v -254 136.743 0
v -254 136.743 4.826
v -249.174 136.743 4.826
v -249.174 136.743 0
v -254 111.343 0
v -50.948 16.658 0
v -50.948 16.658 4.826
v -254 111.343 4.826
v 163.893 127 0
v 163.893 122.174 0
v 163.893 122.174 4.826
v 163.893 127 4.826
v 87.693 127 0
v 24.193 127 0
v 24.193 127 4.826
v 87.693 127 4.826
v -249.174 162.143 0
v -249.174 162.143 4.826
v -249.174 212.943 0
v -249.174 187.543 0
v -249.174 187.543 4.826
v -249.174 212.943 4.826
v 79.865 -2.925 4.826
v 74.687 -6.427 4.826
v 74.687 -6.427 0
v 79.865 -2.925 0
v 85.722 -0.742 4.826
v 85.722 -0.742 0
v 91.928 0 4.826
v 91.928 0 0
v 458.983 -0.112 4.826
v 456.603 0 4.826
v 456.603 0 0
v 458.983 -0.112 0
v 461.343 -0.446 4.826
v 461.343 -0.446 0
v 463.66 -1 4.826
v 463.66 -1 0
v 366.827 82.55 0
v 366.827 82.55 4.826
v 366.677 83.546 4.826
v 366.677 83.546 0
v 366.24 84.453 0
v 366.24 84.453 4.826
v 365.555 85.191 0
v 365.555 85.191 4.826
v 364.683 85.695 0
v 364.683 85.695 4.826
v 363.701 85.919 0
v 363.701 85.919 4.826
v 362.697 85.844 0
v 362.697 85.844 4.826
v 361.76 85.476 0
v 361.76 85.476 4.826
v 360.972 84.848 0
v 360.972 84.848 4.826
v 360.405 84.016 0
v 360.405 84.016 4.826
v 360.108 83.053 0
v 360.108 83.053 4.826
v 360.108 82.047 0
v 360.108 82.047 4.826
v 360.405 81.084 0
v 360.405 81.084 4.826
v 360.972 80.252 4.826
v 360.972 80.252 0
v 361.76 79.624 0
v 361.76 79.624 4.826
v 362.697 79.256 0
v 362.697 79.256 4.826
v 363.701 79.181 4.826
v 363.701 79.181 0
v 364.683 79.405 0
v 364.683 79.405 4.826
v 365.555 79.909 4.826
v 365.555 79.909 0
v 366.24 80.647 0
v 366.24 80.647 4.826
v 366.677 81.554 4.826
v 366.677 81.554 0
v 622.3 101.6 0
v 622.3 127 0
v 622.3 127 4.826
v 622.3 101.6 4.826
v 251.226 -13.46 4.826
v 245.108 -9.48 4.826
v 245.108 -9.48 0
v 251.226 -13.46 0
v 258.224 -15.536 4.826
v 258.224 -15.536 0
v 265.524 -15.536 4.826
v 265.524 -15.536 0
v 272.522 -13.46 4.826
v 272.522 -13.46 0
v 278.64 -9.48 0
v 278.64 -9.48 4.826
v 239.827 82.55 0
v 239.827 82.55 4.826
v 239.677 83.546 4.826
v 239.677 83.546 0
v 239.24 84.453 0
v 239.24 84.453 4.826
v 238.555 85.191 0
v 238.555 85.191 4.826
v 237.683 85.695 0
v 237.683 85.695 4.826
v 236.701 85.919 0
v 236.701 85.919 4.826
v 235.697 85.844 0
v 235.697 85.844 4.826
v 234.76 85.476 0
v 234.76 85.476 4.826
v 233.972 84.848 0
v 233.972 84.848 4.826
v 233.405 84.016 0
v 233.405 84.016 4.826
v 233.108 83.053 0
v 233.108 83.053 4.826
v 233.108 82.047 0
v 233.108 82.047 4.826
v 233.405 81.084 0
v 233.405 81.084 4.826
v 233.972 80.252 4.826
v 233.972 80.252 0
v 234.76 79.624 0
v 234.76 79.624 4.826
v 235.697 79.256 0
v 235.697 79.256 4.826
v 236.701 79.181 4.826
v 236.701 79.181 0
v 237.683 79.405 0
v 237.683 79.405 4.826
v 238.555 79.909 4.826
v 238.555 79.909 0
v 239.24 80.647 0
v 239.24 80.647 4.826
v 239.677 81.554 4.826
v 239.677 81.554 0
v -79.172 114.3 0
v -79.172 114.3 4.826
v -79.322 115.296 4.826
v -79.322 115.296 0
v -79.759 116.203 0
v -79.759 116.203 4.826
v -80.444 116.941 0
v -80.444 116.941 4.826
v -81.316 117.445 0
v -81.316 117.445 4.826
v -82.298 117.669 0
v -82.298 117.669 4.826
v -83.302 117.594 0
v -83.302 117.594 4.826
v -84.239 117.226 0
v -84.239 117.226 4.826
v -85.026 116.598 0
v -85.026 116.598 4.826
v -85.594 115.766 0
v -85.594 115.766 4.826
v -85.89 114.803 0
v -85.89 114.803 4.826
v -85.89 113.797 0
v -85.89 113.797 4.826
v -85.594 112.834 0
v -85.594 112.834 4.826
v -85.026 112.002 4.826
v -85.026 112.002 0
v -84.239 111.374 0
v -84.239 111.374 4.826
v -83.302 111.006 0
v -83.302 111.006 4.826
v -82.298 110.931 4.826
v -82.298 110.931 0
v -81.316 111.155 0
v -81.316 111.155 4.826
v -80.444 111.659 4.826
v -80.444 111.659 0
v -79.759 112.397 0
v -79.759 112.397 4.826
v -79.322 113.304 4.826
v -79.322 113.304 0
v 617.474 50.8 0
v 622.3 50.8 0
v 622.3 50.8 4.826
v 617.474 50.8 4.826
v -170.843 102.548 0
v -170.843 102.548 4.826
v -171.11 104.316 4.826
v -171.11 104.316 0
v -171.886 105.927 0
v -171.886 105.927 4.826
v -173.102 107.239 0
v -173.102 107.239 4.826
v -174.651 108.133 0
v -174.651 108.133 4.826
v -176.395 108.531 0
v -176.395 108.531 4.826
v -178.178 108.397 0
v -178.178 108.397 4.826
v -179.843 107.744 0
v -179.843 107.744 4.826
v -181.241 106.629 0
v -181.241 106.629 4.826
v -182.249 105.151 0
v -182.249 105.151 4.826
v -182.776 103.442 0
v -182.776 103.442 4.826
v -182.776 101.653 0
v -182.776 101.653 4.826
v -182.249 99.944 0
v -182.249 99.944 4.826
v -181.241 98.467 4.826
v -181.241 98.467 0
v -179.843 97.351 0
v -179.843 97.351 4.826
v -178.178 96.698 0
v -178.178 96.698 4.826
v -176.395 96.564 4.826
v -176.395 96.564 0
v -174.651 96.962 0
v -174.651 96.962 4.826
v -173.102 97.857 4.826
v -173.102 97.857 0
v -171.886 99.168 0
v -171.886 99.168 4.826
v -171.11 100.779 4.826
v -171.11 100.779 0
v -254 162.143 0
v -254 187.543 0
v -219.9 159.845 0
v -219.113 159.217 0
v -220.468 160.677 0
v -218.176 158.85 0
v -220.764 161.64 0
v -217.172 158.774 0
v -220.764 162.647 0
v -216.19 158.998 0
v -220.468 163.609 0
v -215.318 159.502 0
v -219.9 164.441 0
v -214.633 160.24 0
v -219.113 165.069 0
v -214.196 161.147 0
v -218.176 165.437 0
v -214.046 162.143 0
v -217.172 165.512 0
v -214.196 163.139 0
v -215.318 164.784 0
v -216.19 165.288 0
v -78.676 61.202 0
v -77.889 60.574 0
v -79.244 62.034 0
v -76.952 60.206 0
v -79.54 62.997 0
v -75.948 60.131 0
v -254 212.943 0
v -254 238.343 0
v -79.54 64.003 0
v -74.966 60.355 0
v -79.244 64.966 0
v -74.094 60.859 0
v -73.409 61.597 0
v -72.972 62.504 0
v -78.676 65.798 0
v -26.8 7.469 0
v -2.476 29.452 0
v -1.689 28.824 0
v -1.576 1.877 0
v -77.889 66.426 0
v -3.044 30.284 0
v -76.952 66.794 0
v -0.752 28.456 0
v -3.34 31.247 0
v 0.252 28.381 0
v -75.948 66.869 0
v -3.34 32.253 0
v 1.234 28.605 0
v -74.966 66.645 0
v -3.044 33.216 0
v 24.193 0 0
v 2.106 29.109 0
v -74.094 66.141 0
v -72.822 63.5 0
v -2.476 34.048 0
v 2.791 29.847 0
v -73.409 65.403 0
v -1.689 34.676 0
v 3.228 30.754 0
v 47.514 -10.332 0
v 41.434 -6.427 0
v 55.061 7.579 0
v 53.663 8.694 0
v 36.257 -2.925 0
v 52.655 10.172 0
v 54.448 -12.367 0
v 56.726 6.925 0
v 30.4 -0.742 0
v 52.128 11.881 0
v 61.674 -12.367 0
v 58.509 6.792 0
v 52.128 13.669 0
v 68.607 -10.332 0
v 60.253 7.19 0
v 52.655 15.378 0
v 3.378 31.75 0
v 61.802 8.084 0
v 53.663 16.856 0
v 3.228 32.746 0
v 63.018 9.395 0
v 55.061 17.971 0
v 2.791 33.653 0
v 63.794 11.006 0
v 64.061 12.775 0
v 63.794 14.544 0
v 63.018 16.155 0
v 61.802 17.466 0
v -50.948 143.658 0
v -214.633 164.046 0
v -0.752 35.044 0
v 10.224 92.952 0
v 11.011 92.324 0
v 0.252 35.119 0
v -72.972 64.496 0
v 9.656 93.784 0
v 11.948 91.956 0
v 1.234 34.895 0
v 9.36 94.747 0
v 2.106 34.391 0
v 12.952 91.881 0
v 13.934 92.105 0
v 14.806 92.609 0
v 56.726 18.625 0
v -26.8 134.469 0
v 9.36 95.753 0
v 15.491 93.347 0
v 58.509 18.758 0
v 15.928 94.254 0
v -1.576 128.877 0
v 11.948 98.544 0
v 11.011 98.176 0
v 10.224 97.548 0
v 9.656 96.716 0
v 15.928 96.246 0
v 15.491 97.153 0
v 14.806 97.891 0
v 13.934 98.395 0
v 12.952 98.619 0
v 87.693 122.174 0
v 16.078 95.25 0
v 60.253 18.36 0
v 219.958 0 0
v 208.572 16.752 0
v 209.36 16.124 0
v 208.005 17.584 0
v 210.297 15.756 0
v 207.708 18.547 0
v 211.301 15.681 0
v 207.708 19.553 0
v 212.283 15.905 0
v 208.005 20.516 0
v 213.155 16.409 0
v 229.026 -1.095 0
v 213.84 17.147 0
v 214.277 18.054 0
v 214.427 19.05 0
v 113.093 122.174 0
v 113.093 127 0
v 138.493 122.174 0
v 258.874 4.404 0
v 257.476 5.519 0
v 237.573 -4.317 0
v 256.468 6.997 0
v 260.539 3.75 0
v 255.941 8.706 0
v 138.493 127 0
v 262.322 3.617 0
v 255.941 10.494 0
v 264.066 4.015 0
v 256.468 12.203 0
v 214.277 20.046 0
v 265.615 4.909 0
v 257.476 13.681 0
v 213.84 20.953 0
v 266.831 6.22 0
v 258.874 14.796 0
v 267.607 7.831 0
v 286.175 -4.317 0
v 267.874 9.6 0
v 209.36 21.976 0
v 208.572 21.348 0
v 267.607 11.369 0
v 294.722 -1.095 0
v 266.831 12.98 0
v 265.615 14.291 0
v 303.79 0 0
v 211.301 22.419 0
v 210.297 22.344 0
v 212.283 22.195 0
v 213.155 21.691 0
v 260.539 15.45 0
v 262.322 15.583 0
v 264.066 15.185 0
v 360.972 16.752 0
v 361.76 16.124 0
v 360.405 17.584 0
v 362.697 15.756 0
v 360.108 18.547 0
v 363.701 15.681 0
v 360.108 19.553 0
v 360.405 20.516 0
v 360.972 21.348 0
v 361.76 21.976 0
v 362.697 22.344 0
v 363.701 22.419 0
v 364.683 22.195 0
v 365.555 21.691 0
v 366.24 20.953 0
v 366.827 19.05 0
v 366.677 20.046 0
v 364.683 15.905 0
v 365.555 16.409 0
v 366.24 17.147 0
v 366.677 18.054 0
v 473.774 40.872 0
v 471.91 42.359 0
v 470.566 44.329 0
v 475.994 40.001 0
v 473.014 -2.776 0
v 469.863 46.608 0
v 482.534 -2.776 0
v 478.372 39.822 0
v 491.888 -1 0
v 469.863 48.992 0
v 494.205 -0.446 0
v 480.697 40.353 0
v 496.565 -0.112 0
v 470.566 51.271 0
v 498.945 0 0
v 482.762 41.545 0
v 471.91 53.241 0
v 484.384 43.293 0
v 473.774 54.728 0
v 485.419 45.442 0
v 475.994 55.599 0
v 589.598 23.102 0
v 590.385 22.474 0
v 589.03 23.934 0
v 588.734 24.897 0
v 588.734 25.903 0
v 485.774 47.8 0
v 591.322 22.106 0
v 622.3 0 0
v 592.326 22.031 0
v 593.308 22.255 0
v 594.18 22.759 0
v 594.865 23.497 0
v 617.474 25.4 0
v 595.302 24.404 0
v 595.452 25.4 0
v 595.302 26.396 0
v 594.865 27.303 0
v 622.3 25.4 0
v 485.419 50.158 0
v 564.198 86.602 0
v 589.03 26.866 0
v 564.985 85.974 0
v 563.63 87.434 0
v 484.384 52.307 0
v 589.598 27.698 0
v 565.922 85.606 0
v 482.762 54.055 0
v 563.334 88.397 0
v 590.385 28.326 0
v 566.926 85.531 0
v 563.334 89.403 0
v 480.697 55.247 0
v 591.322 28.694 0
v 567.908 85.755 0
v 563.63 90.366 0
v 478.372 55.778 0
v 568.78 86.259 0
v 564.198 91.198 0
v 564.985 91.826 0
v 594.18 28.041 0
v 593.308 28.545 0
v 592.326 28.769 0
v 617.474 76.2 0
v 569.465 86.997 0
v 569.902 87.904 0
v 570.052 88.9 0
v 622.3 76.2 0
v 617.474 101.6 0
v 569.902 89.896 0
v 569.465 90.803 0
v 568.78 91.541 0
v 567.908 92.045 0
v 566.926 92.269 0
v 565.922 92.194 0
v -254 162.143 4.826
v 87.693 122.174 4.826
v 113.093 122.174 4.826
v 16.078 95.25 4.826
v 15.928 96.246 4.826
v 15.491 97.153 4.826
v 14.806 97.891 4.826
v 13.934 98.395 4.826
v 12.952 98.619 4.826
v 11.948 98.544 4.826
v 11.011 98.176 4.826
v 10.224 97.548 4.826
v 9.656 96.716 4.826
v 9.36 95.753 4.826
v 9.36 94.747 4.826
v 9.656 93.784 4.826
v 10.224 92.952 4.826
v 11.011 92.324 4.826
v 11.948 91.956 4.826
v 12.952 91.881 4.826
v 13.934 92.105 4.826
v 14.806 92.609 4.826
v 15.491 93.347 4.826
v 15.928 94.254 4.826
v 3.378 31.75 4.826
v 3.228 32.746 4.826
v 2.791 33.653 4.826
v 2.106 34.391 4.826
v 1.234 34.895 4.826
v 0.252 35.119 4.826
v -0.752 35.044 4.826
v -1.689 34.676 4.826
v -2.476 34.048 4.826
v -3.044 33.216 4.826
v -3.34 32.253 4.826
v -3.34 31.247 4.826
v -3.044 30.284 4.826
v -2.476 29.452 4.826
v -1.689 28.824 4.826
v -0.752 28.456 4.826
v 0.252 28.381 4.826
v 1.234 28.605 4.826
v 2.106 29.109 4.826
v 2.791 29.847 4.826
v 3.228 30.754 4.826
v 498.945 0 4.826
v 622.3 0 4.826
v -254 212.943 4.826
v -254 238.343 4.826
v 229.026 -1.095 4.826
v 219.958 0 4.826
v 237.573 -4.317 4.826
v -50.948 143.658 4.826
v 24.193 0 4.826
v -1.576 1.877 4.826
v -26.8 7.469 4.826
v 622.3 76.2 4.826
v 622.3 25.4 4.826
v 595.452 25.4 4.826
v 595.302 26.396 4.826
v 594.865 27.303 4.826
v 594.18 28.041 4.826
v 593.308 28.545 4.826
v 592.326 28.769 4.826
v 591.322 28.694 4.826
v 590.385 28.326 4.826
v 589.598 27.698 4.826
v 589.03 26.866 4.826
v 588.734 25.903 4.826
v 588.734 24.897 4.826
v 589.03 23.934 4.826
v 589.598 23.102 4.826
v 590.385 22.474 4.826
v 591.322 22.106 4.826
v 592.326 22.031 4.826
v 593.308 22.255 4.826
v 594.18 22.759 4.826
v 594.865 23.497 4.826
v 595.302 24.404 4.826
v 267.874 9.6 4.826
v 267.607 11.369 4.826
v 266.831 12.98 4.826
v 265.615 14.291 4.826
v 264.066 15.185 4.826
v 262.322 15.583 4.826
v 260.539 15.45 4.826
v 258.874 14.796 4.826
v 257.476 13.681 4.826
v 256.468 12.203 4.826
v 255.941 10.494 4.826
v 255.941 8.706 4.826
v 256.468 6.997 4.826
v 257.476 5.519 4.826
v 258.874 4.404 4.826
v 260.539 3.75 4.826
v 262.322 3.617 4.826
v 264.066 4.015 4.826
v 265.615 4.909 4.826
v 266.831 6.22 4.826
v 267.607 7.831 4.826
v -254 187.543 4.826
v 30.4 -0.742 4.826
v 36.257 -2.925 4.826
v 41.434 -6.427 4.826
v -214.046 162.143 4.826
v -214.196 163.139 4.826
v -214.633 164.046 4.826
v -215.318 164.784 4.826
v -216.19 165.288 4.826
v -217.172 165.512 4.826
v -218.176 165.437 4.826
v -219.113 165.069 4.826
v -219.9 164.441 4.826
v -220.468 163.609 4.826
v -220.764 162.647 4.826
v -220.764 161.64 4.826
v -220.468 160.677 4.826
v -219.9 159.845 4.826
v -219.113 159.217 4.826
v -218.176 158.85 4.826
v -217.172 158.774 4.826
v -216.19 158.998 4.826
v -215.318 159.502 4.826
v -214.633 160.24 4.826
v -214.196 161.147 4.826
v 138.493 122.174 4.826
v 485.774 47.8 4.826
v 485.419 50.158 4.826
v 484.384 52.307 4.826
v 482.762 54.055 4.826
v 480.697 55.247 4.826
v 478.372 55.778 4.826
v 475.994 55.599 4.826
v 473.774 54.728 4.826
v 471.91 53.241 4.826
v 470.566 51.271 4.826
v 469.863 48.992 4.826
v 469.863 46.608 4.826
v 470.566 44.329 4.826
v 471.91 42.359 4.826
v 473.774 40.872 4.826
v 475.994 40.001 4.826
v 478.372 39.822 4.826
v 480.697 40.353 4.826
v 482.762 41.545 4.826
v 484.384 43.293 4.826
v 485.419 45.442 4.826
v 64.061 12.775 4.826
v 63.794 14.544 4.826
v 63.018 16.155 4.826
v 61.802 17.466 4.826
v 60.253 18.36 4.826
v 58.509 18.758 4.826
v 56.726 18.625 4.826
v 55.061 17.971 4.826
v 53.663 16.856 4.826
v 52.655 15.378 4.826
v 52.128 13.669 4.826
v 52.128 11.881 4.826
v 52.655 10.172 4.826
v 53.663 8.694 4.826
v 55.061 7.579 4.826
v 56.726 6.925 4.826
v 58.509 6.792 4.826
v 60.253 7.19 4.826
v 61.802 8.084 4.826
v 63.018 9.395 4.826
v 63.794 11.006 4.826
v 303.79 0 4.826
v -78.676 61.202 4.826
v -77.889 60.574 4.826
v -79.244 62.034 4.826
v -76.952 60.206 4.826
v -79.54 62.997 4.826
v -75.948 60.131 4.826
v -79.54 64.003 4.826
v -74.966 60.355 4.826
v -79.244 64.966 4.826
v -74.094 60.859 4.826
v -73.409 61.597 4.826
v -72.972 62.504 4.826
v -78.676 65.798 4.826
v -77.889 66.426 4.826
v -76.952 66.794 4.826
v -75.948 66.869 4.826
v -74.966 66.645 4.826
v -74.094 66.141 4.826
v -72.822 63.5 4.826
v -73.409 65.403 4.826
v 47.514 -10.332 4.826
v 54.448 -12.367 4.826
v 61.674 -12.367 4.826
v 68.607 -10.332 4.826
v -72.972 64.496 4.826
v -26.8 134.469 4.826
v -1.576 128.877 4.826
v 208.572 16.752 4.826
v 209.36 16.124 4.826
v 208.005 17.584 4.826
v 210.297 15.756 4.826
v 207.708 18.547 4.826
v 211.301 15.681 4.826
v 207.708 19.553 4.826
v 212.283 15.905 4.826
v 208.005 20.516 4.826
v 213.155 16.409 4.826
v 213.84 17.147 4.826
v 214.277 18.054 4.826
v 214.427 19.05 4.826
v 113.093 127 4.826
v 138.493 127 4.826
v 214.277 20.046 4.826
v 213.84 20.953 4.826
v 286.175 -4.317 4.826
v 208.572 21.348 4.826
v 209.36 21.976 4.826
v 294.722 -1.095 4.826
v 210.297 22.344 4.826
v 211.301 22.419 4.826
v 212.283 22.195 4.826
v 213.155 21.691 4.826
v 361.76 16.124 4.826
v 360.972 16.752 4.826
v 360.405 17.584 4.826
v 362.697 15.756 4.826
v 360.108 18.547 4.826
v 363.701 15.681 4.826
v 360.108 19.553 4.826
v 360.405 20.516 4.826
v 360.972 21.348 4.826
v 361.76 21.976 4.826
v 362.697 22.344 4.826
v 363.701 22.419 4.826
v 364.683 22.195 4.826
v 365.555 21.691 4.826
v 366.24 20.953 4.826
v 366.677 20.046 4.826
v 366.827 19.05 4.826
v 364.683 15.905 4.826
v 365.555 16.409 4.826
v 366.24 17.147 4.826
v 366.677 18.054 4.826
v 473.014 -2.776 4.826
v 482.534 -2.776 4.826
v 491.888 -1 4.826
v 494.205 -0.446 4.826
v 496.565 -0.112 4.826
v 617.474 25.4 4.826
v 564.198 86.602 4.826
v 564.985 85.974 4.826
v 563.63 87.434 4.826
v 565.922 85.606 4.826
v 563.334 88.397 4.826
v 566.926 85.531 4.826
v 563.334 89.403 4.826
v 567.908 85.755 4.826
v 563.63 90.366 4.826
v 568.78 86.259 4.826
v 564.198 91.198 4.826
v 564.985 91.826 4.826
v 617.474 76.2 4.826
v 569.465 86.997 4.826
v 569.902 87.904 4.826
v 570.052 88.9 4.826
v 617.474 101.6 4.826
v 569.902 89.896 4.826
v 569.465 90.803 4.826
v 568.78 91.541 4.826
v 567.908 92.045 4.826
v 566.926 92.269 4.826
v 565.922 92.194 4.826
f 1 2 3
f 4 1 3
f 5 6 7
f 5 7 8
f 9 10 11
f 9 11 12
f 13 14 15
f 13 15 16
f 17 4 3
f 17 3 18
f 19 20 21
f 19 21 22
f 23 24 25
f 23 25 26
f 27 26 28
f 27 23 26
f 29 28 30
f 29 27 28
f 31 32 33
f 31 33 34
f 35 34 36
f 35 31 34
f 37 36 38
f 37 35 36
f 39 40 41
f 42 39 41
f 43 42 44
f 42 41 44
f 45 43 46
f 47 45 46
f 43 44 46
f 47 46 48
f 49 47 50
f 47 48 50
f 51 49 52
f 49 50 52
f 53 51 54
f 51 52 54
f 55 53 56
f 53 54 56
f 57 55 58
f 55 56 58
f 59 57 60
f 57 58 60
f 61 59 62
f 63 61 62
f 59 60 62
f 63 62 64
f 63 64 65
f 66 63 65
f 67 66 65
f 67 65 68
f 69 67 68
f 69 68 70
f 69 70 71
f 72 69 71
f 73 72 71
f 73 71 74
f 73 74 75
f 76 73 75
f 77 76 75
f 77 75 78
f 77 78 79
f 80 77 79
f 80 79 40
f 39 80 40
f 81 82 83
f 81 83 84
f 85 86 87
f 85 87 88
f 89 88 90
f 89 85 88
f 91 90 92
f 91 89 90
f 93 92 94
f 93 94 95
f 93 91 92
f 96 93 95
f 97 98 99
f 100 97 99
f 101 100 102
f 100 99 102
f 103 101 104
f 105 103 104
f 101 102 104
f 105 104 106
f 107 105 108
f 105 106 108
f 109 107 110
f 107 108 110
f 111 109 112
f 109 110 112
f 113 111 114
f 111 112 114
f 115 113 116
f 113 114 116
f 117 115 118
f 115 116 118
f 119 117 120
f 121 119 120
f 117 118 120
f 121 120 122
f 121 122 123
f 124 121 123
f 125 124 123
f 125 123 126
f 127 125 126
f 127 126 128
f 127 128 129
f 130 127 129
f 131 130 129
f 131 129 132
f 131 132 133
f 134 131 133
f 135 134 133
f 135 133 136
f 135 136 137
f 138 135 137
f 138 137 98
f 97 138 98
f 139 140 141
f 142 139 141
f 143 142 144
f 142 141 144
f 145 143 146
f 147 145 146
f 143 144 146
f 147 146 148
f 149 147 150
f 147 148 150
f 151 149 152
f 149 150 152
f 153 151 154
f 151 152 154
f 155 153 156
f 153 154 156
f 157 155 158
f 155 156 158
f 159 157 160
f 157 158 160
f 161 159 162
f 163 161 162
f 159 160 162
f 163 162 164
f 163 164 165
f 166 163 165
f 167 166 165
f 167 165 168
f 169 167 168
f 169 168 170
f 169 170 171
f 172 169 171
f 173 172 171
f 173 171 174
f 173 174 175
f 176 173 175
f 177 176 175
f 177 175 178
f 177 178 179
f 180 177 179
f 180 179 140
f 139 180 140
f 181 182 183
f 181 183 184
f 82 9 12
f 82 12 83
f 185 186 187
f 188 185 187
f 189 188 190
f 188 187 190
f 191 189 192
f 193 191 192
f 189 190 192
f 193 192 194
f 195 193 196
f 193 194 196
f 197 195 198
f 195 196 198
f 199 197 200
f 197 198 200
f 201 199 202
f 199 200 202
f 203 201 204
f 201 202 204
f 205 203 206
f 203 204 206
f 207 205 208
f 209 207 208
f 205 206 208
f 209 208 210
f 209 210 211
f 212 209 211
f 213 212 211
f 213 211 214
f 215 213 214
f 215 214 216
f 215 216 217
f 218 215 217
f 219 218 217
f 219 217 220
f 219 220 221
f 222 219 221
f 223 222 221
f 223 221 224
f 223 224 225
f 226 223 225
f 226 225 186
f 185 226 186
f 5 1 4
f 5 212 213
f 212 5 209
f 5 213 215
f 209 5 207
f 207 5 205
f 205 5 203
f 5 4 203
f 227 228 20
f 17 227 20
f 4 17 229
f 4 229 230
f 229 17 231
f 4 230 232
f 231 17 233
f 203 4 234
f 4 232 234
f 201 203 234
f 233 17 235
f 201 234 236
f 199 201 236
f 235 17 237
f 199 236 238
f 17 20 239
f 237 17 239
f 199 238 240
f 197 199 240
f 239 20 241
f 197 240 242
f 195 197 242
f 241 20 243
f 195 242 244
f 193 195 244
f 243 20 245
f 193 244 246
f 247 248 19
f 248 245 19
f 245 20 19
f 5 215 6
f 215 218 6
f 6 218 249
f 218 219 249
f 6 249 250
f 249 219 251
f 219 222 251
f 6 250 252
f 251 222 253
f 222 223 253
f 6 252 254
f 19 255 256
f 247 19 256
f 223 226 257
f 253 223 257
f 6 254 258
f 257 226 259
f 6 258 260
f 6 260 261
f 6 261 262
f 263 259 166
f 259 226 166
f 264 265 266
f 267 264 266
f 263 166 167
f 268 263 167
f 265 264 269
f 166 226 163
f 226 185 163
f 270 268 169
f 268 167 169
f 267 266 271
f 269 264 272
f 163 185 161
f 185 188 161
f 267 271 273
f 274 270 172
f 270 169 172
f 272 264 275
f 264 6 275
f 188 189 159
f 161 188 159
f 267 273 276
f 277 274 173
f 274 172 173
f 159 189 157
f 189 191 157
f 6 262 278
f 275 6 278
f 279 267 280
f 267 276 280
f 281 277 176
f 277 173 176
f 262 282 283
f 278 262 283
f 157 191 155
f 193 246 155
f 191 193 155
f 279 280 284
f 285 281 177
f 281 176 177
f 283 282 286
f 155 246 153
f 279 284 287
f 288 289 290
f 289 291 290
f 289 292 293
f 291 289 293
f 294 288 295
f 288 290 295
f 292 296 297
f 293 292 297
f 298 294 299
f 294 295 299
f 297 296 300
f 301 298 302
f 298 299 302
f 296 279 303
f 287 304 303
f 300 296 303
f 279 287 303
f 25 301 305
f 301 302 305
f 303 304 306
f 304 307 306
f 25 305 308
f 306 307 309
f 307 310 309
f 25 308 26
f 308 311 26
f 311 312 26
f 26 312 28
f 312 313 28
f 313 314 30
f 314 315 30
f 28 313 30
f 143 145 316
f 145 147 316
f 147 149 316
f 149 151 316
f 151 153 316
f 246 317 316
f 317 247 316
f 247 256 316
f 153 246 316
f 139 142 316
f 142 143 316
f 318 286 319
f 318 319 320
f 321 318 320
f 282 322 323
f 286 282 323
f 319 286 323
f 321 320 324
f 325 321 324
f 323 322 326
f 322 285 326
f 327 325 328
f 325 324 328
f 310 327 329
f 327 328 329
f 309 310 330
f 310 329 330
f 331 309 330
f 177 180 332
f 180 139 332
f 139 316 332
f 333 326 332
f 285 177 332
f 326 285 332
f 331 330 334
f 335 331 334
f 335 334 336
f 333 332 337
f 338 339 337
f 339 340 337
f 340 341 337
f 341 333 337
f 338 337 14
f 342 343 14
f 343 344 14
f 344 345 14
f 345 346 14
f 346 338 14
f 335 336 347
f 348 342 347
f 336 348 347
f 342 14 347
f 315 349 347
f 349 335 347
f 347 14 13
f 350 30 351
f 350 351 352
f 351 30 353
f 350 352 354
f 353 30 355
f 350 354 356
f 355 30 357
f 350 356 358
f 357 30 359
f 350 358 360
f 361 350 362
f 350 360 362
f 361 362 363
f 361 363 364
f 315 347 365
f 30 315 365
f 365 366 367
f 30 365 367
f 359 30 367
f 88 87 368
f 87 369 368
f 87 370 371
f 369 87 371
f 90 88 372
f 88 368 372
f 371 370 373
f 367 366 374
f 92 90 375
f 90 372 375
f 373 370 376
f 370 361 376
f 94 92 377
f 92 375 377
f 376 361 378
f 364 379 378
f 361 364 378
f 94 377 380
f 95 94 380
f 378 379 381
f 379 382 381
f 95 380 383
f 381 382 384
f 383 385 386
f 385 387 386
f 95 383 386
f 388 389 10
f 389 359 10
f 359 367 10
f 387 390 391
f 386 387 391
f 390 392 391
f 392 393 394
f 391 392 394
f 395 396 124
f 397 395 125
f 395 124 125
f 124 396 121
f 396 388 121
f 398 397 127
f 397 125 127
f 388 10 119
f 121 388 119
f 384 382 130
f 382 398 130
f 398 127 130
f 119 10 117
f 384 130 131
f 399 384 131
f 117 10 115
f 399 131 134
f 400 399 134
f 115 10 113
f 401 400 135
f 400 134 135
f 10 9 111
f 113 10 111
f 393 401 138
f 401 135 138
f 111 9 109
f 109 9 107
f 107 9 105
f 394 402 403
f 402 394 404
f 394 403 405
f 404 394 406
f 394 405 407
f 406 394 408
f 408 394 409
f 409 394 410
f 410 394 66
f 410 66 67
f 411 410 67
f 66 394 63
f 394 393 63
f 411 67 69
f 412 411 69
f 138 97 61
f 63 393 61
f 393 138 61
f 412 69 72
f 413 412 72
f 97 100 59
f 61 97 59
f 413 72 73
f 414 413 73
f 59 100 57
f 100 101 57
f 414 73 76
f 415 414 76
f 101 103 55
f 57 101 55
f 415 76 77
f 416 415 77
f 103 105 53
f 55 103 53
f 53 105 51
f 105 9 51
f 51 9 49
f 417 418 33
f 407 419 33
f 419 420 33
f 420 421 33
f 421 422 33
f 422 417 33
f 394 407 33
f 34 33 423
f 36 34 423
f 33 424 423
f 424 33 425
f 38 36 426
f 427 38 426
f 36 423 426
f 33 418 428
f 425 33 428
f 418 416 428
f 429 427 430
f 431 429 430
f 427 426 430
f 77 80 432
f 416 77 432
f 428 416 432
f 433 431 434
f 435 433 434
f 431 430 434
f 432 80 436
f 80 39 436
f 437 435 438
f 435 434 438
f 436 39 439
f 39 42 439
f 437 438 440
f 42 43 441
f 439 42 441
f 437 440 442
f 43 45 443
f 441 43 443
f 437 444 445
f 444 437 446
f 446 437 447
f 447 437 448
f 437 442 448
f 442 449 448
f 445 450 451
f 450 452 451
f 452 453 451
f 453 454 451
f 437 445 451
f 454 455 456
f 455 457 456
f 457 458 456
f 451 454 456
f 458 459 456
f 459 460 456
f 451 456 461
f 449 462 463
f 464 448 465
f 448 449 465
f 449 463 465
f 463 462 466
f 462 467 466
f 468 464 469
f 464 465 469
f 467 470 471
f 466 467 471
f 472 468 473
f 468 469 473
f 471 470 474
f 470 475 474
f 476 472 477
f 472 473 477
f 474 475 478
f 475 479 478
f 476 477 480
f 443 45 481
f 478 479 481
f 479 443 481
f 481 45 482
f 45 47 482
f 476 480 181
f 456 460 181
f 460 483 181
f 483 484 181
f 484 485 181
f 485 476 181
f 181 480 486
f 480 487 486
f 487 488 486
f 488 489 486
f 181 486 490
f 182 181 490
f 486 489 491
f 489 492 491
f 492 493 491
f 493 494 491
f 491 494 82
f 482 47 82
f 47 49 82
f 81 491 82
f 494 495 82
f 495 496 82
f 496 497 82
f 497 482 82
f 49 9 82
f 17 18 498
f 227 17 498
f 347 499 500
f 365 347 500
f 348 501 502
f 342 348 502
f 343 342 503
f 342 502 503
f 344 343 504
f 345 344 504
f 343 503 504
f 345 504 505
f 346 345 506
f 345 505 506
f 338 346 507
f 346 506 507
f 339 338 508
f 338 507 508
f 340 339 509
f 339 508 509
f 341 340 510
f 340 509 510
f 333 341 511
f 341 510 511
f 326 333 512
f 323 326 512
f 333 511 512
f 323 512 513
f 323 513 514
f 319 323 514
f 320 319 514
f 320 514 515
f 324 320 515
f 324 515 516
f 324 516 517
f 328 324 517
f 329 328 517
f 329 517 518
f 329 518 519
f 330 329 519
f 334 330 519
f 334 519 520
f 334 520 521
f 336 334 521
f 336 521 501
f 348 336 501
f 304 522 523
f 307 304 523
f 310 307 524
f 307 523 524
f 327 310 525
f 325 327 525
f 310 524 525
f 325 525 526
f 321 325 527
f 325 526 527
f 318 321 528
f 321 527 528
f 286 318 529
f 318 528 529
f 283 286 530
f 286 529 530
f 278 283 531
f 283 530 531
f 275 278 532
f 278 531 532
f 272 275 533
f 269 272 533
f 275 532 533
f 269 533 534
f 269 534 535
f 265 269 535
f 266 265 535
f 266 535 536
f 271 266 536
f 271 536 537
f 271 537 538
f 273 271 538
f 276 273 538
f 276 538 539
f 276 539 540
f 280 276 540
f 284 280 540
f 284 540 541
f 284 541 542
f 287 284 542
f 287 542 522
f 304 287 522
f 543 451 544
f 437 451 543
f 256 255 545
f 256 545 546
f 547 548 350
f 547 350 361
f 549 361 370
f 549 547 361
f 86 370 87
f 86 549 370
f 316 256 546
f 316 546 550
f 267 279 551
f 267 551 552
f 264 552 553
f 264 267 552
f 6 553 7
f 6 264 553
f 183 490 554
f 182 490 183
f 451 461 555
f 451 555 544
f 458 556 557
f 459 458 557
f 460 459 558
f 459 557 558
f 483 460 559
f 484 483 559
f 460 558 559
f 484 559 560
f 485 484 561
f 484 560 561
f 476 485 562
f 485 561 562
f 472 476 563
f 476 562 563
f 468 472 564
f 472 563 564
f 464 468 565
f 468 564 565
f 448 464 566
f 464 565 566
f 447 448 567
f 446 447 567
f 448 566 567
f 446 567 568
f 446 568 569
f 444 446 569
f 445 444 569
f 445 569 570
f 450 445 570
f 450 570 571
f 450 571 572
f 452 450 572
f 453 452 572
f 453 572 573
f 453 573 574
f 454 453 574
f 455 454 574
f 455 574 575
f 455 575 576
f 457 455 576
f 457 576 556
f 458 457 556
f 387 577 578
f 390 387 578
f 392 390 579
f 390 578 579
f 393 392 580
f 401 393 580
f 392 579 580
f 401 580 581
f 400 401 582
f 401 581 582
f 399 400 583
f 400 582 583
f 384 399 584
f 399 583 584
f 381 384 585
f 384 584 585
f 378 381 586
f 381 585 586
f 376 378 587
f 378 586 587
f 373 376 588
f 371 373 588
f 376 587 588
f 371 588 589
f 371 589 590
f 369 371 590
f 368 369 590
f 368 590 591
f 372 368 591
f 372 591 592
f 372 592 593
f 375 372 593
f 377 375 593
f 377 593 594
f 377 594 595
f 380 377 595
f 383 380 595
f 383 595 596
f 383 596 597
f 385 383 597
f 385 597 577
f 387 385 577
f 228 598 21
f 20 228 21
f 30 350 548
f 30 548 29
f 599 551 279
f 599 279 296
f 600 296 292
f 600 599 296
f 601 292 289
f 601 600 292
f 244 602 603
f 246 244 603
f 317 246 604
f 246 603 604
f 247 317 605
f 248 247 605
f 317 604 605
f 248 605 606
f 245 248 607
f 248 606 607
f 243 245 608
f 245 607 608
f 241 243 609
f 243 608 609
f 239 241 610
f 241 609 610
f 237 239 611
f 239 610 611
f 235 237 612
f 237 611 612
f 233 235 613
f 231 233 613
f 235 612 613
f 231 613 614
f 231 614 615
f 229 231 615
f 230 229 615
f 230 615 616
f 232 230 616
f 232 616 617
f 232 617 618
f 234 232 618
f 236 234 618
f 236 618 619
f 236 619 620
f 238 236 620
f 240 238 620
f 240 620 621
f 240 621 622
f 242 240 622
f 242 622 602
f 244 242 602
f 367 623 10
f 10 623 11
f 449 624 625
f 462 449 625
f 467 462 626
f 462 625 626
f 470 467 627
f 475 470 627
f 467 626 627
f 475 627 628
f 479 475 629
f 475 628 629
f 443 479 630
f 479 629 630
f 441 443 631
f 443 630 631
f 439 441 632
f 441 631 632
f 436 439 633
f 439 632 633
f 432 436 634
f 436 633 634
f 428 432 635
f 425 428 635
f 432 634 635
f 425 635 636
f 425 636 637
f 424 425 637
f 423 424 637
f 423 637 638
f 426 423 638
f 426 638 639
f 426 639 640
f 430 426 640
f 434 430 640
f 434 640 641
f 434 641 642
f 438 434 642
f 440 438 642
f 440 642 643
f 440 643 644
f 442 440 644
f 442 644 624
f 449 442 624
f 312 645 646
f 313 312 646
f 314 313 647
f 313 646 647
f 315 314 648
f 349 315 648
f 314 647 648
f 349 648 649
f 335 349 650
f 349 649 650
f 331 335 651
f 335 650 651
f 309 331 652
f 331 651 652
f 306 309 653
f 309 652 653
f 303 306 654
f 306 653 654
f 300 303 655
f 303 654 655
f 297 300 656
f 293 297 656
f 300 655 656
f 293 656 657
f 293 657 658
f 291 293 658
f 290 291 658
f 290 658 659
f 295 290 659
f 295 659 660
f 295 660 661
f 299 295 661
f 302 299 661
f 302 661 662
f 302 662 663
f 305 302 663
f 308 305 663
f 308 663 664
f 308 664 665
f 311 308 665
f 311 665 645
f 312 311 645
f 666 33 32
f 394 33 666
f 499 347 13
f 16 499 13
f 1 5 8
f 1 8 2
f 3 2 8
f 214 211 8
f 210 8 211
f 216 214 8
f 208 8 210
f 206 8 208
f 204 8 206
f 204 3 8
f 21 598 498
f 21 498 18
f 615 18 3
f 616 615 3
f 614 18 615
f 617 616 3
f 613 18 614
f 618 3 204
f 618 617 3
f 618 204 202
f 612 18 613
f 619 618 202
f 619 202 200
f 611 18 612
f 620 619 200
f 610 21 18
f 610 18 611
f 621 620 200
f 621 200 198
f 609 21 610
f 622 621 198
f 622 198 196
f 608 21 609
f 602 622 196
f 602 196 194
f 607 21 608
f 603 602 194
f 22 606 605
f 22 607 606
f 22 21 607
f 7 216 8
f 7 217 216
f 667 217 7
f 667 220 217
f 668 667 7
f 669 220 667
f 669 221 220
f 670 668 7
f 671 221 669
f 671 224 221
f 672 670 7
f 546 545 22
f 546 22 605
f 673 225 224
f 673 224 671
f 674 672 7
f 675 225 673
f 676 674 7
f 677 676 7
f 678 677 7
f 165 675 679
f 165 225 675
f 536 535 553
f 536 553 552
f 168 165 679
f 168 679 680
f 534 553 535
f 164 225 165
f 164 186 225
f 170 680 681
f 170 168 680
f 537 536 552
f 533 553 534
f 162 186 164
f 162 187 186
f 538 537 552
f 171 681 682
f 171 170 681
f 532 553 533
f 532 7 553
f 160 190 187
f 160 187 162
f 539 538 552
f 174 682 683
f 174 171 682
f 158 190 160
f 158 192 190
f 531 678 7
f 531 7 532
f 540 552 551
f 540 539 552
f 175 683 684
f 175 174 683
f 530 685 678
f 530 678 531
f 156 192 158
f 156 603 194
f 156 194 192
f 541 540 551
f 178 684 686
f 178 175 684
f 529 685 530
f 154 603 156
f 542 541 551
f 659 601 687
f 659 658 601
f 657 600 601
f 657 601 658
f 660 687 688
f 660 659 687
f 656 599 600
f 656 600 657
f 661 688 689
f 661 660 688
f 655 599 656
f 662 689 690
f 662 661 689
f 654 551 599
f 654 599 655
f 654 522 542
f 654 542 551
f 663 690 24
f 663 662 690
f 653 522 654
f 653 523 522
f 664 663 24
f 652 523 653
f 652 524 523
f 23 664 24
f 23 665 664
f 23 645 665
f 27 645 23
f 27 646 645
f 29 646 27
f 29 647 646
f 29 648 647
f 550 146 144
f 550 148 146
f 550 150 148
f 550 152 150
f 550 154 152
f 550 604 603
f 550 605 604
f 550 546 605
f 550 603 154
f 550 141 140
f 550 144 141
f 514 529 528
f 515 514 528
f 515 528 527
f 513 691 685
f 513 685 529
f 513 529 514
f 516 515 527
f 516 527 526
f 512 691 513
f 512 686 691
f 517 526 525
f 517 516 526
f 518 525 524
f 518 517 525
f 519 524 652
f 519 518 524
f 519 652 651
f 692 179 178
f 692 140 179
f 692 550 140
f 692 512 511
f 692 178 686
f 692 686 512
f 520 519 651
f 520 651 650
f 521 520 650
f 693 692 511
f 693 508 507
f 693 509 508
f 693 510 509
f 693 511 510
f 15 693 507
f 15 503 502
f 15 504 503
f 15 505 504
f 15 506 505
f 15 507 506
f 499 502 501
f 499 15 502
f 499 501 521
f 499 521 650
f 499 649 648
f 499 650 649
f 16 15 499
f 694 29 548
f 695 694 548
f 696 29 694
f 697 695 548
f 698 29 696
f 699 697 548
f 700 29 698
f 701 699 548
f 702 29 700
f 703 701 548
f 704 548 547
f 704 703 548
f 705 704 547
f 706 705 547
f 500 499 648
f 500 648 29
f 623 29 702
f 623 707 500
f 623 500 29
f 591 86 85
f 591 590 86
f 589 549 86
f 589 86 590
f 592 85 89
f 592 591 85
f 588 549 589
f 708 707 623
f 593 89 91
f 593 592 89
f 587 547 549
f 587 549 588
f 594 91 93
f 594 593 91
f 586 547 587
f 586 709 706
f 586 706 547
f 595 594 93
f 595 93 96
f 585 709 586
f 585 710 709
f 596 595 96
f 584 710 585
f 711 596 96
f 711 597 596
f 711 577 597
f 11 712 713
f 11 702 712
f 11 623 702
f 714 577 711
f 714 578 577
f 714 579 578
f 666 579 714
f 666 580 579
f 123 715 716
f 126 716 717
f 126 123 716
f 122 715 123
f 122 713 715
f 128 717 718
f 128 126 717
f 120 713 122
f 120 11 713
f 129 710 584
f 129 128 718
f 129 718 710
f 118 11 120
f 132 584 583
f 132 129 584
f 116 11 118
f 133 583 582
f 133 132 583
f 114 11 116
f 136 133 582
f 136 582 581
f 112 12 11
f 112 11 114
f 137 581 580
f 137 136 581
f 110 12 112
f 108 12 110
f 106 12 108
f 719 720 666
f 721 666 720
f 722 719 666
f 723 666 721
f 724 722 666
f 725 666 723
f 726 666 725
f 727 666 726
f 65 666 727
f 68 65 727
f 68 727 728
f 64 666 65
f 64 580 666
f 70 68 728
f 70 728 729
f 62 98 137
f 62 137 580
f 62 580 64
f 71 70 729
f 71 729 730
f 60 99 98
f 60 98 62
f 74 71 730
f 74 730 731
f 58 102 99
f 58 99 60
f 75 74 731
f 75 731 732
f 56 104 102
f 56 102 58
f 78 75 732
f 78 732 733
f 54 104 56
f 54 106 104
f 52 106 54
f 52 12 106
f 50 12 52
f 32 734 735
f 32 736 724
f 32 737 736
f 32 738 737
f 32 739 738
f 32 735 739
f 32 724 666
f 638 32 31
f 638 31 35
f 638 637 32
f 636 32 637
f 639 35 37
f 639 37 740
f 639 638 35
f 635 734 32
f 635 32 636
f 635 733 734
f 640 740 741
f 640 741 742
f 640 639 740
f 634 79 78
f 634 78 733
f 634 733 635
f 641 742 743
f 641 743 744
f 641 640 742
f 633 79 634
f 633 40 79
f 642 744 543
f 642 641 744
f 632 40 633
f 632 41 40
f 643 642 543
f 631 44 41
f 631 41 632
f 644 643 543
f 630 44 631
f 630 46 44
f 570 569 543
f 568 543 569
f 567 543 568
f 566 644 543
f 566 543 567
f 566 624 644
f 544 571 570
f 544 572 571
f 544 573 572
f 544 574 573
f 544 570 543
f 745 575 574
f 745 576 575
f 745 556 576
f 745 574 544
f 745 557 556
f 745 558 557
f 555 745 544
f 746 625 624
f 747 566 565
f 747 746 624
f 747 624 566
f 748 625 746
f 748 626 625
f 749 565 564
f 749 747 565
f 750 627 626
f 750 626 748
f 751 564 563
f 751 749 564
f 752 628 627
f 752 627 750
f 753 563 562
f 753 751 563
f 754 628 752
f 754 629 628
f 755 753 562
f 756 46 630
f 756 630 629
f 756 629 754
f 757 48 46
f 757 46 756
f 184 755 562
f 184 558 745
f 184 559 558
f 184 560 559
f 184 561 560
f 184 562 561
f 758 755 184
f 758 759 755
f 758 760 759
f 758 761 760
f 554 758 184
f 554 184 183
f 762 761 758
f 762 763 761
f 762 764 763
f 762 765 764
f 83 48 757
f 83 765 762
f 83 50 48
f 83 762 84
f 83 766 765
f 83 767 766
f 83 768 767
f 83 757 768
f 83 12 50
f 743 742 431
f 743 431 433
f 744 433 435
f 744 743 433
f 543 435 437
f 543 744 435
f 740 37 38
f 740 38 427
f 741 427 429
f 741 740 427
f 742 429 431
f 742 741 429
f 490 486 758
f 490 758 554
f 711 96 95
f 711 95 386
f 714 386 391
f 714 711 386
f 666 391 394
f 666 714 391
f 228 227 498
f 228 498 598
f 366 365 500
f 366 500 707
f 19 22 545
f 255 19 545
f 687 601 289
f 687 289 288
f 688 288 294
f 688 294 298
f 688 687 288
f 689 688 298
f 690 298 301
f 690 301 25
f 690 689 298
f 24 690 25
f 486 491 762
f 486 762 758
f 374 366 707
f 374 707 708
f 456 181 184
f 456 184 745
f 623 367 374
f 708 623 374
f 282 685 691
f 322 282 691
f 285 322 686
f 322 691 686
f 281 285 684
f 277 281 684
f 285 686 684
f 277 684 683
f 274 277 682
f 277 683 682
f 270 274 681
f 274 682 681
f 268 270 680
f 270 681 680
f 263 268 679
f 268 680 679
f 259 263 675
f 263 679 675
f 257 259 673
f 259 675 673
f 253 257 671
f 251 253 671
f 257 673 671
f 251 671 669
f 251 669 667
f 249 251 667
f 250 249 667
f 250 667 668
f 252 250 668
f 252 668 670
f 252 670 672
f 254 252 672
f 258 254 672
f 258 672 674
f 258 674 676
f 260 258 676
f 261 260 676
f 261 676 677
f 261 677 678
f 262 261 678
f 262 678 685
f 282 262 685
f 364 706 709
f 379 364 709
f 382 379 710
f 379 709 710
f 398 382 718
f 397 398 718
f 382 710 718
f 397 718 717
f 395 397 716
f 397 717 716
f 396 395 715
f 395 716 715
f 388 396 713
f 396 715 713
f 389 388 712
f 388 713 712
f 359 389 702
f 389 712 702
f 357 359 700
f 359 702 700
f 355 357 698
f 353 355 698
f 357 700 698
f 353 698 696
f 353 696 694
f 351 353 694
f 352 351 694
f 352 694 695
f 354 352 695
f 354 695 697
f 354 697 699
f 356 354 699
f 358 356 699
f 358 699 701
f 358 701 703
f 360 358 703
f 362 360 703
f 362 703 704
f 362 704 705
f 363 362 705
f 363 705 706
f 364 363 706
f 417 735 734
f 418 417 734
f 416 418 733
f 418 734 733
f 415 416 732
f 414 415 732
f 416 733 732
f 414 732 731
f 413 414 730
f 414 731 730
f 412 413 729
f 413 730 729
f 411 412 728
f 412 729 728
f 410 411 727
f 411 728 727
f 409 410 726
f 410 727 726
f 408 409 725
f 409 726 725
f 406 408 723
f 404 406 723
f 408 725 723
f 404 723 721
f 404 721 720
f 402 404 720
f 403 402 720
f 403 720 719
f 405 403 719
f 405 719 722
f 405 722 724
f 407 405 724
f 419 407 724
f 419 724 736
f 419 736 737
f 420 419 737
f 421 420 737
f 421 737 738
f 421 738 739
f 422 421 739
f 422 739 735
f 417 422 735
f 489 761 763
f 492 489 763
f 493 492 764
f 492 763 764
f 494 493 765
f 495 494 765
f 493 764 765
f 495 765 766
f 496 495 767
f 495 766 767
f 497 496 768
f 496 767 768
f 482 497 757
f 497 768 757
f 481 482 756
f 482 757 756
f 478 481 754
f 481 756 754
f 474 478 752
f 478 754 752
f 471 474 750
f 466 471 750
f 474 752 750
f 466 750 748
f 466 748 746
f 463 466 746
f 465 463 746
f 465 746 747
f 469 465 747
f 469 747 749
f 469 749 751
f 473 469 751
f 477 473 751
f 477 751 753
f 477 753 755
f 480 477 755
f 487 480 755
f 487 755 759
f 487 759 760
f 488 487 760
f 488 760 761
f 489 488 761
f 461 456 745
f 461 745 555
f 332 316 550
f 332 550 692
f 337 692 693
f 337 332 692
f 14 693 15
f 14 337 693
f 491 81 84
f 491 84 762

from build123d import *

# Parameters (mm, degrees)
BOSS_EXTRUDE1_DEPTH              = 4.826
SKETCH5_R                        = 3.3782
STANDOFF_HOLE_DEPTH              = 5.826
SKETCH8_W                        = 25.4
SKETCH8_H                        = 4.826
TOP_SLOTS_DEPTH                  = 5.826
BACK_AXLE_EXTENSION_DEPTH        = 4.826
LOWER_SMALL_AXLE_EXTENSION_DEPTH = 4.826
FRONT_SMALL_AXLE_EXTENSION_DEPTH = 4.826
SKETCH10_R                       = 8
SKETCH10_R_2                     = 6
NEW_AXLE_HOLES_DEPTH             = 5.826


with BuildPart() as part:
    # outer face → Boss-Extrude1 (new body)
    with BuildSketch(Plane.XY):
        with BuildLine():
            Line((622.3, 0), (24.193267589, 0))
            ThreePointArc((24.193267589, 0), (-14.28969577, 4.214569934), (-50.948259349, 16.658475465))
            Line((-50.948259349, 16.658475465), (-254, 111.343057132))
            Line((-254, 111.343057132), (-254, 136.743057132))
            Line((-254, 136.743057132), (-249.174, 136.743057132))
            Line((-249.174, 136.743057132), (-249.174, 162.143057132))
            Line((-249.174, 162.143057132), (-254, 162.143057132))
            Line((-254, 162.143057132), (-254, 187.543057132))
            Line((-254, 187.543057132), (-249.174, 187.543057132))
            Line((-249.174, 187.543057132), (-249.174, 212.943057132))
            Line((-249.174, 212.943057132), (-254, 212.943057132))
            Line((-254, 212.943057132), (-254, 238.343057132))
            Line((-254, 238.343057132), (-50.948259349, 143.658475465))
            ThreePointArc((-50.948259349, 143.658475465), (-14.28969577, 131.214569934), (24.193267589, 127))
            Line((24.193267589, 127), (622.3, 127))
            Line((622.3, 127), (622.3, 101.6))
            Line((622.3, 101.6), (617.474, 101.6))
            Line((617.474, 101.6), (617.474, 76.2))
            Line((617.474, 76.2), (622.3, 76.2))
            Line((622.3, 76.2), (622.3, 50.8))
            Line((622.3, 50.8), (617.474, 50.8))
            Line((617.474, 50.8), (617.474, 25.4))
            Line((617.474, 25.4), (622.3, 25.4))
            Line((622.3, 25.4), (622.3, 0))
        make_face()
    extrude(amount=BOSS_EXTRUDE1_DEPTH)

    # Sketch5 → standoff hole (cut, through all)
    with BuildSketch(Plane.XY.offset(4.826)):
        with Locations((-76.2, 63.5)):
            Circle(SKETCH5_R)
        with Locations((-82.55, 114.3)):
            Circle(SKETCH5_R)
        with Locations((592.074, 25.4)):
            Circle(SKETCH5_R)
        with Locations((0, 31.75)):
            Circle(SKETCH5_R)
        with Locations((211.0486, 19.05)):
            Circle(SKETCH5_R)
        with Locations((236.4486, 82.55)):
            Circle(SKETCH5_R)
        with Locations((363.4486, 82.55)):
            Circle(SKETCH5_R)
        with Locations((363.4486, 19.05)):
            Circle(SKETCH5_R)
        with Locations((566.674, 88.9)):
            Circle(SKETCH5_R)
        with Locations((12.7, 95.25)):
            Circle(SKETCH5_R)
        with Locations((-217.424, 162.143057132)):
            Circle(SKETCH5_R)
    extrude(amount=-STANDOFF_HOLE_DEPTH, mode=Mode.SUBTRACT)

    # Sketch8 → top slots (cut, through all)
    with BuildSketch(Plane.XY.offset(4.826)):
        with Locations((100.393267589, 124.587)):
            Rectangle(SKETCH8_W, SKETCH8_H)
        with Locations((151.193267589, 124.587)):
            Rectangle(SKETCH8_W, SKETCH8_H)
    extrude(amount=-TOP_SLOTS_DEPTH, mode=Mode.SUBTRACT)

    # Sketch9 → back axle extension (add)
    with BuildSketch(Plane.XY.offset(4.826)):
        with BuildLine():
            Line((498.944734517, 0), (456.603265483, 0))
            ThreePointArc((456.603265483, 0), (460.166971419, -0.251242575), (463.660176989, -1))
            ThreePointArc((463.660176989, -1), (477.774, -3), (491.887823011, -1))
            ThreePointArc((491.887823011, -1), (495.381028581, -0.251242575), (498.944734517, 0))
        make_face()
    extrude(amount=-BACK_AXLE_EXTENSION_DEPTH)

    # Sketch11 → lower small axle extension (add)
    with BuildSketch(Plane.XY.offset(4.826)):
        with BuildLine():
            Line((303.790106689, 0), (219.957893311, 0))
            ThreePointArc((219.957893311, 0), (233.396420016, -2.448688664), (245.107557324, -9.48))
            ThreePointArc((245.107557324, -9.48), (261.874, -15.8), (278.640442676, -9.48))
            ThreePointArc((278.640442676, -9.48), (290.351579984, -2.448688664), (303.790106689, 0))
        make_face()
    extrude(amount=-LOWER_SMALL_AXLE_EXTENSION_DEPTH)

    # Sketch13 → front small axle extension (add)
    with BuildSketch(Plane.XY.offset(4.826)):
        with BuildLine():
            Line((91.928424908, 0), (24.193267589, 0))
            ThreePointArc((24.193267589, 0), (33.393269649, -1.659006827), (41.434305199, -6.427034599))
            ThreePointArc((41.434305199, -6.427034599), (58.060846248, -12.625), (74.687387297, -6.427034599))
            ThreePointArc((74.687387297, -6.427034599), (82.728422848, -1.659006827), (91.928424908, 0))
        make_face()
    extrude(amount=-FRONT_SMALL_AXLE_EXTENSION_DEPTH)

    # Sketch10 → new axle holes (cut, through all)
    with BuildSketch(Plane.XY.offset(4.826)):
        with Locations((477.774, 47.8)):
            Circle(SKETCH10_R)
        with Locations((261.874, 9.6)):
            Circle(SKETCH10_R_2)
        with Locations((58.060846248, 12.775)):
            Circle(SKETCH10_R_2)
        with Locations((-176.843107922, 102.547565902)):
            Circle(SKETCH10_R_2)
    extrude(amount=-NEW_AXLE_HOLES_DEPTH, mode=Mode.SUBTRACT)


solid = part.part
